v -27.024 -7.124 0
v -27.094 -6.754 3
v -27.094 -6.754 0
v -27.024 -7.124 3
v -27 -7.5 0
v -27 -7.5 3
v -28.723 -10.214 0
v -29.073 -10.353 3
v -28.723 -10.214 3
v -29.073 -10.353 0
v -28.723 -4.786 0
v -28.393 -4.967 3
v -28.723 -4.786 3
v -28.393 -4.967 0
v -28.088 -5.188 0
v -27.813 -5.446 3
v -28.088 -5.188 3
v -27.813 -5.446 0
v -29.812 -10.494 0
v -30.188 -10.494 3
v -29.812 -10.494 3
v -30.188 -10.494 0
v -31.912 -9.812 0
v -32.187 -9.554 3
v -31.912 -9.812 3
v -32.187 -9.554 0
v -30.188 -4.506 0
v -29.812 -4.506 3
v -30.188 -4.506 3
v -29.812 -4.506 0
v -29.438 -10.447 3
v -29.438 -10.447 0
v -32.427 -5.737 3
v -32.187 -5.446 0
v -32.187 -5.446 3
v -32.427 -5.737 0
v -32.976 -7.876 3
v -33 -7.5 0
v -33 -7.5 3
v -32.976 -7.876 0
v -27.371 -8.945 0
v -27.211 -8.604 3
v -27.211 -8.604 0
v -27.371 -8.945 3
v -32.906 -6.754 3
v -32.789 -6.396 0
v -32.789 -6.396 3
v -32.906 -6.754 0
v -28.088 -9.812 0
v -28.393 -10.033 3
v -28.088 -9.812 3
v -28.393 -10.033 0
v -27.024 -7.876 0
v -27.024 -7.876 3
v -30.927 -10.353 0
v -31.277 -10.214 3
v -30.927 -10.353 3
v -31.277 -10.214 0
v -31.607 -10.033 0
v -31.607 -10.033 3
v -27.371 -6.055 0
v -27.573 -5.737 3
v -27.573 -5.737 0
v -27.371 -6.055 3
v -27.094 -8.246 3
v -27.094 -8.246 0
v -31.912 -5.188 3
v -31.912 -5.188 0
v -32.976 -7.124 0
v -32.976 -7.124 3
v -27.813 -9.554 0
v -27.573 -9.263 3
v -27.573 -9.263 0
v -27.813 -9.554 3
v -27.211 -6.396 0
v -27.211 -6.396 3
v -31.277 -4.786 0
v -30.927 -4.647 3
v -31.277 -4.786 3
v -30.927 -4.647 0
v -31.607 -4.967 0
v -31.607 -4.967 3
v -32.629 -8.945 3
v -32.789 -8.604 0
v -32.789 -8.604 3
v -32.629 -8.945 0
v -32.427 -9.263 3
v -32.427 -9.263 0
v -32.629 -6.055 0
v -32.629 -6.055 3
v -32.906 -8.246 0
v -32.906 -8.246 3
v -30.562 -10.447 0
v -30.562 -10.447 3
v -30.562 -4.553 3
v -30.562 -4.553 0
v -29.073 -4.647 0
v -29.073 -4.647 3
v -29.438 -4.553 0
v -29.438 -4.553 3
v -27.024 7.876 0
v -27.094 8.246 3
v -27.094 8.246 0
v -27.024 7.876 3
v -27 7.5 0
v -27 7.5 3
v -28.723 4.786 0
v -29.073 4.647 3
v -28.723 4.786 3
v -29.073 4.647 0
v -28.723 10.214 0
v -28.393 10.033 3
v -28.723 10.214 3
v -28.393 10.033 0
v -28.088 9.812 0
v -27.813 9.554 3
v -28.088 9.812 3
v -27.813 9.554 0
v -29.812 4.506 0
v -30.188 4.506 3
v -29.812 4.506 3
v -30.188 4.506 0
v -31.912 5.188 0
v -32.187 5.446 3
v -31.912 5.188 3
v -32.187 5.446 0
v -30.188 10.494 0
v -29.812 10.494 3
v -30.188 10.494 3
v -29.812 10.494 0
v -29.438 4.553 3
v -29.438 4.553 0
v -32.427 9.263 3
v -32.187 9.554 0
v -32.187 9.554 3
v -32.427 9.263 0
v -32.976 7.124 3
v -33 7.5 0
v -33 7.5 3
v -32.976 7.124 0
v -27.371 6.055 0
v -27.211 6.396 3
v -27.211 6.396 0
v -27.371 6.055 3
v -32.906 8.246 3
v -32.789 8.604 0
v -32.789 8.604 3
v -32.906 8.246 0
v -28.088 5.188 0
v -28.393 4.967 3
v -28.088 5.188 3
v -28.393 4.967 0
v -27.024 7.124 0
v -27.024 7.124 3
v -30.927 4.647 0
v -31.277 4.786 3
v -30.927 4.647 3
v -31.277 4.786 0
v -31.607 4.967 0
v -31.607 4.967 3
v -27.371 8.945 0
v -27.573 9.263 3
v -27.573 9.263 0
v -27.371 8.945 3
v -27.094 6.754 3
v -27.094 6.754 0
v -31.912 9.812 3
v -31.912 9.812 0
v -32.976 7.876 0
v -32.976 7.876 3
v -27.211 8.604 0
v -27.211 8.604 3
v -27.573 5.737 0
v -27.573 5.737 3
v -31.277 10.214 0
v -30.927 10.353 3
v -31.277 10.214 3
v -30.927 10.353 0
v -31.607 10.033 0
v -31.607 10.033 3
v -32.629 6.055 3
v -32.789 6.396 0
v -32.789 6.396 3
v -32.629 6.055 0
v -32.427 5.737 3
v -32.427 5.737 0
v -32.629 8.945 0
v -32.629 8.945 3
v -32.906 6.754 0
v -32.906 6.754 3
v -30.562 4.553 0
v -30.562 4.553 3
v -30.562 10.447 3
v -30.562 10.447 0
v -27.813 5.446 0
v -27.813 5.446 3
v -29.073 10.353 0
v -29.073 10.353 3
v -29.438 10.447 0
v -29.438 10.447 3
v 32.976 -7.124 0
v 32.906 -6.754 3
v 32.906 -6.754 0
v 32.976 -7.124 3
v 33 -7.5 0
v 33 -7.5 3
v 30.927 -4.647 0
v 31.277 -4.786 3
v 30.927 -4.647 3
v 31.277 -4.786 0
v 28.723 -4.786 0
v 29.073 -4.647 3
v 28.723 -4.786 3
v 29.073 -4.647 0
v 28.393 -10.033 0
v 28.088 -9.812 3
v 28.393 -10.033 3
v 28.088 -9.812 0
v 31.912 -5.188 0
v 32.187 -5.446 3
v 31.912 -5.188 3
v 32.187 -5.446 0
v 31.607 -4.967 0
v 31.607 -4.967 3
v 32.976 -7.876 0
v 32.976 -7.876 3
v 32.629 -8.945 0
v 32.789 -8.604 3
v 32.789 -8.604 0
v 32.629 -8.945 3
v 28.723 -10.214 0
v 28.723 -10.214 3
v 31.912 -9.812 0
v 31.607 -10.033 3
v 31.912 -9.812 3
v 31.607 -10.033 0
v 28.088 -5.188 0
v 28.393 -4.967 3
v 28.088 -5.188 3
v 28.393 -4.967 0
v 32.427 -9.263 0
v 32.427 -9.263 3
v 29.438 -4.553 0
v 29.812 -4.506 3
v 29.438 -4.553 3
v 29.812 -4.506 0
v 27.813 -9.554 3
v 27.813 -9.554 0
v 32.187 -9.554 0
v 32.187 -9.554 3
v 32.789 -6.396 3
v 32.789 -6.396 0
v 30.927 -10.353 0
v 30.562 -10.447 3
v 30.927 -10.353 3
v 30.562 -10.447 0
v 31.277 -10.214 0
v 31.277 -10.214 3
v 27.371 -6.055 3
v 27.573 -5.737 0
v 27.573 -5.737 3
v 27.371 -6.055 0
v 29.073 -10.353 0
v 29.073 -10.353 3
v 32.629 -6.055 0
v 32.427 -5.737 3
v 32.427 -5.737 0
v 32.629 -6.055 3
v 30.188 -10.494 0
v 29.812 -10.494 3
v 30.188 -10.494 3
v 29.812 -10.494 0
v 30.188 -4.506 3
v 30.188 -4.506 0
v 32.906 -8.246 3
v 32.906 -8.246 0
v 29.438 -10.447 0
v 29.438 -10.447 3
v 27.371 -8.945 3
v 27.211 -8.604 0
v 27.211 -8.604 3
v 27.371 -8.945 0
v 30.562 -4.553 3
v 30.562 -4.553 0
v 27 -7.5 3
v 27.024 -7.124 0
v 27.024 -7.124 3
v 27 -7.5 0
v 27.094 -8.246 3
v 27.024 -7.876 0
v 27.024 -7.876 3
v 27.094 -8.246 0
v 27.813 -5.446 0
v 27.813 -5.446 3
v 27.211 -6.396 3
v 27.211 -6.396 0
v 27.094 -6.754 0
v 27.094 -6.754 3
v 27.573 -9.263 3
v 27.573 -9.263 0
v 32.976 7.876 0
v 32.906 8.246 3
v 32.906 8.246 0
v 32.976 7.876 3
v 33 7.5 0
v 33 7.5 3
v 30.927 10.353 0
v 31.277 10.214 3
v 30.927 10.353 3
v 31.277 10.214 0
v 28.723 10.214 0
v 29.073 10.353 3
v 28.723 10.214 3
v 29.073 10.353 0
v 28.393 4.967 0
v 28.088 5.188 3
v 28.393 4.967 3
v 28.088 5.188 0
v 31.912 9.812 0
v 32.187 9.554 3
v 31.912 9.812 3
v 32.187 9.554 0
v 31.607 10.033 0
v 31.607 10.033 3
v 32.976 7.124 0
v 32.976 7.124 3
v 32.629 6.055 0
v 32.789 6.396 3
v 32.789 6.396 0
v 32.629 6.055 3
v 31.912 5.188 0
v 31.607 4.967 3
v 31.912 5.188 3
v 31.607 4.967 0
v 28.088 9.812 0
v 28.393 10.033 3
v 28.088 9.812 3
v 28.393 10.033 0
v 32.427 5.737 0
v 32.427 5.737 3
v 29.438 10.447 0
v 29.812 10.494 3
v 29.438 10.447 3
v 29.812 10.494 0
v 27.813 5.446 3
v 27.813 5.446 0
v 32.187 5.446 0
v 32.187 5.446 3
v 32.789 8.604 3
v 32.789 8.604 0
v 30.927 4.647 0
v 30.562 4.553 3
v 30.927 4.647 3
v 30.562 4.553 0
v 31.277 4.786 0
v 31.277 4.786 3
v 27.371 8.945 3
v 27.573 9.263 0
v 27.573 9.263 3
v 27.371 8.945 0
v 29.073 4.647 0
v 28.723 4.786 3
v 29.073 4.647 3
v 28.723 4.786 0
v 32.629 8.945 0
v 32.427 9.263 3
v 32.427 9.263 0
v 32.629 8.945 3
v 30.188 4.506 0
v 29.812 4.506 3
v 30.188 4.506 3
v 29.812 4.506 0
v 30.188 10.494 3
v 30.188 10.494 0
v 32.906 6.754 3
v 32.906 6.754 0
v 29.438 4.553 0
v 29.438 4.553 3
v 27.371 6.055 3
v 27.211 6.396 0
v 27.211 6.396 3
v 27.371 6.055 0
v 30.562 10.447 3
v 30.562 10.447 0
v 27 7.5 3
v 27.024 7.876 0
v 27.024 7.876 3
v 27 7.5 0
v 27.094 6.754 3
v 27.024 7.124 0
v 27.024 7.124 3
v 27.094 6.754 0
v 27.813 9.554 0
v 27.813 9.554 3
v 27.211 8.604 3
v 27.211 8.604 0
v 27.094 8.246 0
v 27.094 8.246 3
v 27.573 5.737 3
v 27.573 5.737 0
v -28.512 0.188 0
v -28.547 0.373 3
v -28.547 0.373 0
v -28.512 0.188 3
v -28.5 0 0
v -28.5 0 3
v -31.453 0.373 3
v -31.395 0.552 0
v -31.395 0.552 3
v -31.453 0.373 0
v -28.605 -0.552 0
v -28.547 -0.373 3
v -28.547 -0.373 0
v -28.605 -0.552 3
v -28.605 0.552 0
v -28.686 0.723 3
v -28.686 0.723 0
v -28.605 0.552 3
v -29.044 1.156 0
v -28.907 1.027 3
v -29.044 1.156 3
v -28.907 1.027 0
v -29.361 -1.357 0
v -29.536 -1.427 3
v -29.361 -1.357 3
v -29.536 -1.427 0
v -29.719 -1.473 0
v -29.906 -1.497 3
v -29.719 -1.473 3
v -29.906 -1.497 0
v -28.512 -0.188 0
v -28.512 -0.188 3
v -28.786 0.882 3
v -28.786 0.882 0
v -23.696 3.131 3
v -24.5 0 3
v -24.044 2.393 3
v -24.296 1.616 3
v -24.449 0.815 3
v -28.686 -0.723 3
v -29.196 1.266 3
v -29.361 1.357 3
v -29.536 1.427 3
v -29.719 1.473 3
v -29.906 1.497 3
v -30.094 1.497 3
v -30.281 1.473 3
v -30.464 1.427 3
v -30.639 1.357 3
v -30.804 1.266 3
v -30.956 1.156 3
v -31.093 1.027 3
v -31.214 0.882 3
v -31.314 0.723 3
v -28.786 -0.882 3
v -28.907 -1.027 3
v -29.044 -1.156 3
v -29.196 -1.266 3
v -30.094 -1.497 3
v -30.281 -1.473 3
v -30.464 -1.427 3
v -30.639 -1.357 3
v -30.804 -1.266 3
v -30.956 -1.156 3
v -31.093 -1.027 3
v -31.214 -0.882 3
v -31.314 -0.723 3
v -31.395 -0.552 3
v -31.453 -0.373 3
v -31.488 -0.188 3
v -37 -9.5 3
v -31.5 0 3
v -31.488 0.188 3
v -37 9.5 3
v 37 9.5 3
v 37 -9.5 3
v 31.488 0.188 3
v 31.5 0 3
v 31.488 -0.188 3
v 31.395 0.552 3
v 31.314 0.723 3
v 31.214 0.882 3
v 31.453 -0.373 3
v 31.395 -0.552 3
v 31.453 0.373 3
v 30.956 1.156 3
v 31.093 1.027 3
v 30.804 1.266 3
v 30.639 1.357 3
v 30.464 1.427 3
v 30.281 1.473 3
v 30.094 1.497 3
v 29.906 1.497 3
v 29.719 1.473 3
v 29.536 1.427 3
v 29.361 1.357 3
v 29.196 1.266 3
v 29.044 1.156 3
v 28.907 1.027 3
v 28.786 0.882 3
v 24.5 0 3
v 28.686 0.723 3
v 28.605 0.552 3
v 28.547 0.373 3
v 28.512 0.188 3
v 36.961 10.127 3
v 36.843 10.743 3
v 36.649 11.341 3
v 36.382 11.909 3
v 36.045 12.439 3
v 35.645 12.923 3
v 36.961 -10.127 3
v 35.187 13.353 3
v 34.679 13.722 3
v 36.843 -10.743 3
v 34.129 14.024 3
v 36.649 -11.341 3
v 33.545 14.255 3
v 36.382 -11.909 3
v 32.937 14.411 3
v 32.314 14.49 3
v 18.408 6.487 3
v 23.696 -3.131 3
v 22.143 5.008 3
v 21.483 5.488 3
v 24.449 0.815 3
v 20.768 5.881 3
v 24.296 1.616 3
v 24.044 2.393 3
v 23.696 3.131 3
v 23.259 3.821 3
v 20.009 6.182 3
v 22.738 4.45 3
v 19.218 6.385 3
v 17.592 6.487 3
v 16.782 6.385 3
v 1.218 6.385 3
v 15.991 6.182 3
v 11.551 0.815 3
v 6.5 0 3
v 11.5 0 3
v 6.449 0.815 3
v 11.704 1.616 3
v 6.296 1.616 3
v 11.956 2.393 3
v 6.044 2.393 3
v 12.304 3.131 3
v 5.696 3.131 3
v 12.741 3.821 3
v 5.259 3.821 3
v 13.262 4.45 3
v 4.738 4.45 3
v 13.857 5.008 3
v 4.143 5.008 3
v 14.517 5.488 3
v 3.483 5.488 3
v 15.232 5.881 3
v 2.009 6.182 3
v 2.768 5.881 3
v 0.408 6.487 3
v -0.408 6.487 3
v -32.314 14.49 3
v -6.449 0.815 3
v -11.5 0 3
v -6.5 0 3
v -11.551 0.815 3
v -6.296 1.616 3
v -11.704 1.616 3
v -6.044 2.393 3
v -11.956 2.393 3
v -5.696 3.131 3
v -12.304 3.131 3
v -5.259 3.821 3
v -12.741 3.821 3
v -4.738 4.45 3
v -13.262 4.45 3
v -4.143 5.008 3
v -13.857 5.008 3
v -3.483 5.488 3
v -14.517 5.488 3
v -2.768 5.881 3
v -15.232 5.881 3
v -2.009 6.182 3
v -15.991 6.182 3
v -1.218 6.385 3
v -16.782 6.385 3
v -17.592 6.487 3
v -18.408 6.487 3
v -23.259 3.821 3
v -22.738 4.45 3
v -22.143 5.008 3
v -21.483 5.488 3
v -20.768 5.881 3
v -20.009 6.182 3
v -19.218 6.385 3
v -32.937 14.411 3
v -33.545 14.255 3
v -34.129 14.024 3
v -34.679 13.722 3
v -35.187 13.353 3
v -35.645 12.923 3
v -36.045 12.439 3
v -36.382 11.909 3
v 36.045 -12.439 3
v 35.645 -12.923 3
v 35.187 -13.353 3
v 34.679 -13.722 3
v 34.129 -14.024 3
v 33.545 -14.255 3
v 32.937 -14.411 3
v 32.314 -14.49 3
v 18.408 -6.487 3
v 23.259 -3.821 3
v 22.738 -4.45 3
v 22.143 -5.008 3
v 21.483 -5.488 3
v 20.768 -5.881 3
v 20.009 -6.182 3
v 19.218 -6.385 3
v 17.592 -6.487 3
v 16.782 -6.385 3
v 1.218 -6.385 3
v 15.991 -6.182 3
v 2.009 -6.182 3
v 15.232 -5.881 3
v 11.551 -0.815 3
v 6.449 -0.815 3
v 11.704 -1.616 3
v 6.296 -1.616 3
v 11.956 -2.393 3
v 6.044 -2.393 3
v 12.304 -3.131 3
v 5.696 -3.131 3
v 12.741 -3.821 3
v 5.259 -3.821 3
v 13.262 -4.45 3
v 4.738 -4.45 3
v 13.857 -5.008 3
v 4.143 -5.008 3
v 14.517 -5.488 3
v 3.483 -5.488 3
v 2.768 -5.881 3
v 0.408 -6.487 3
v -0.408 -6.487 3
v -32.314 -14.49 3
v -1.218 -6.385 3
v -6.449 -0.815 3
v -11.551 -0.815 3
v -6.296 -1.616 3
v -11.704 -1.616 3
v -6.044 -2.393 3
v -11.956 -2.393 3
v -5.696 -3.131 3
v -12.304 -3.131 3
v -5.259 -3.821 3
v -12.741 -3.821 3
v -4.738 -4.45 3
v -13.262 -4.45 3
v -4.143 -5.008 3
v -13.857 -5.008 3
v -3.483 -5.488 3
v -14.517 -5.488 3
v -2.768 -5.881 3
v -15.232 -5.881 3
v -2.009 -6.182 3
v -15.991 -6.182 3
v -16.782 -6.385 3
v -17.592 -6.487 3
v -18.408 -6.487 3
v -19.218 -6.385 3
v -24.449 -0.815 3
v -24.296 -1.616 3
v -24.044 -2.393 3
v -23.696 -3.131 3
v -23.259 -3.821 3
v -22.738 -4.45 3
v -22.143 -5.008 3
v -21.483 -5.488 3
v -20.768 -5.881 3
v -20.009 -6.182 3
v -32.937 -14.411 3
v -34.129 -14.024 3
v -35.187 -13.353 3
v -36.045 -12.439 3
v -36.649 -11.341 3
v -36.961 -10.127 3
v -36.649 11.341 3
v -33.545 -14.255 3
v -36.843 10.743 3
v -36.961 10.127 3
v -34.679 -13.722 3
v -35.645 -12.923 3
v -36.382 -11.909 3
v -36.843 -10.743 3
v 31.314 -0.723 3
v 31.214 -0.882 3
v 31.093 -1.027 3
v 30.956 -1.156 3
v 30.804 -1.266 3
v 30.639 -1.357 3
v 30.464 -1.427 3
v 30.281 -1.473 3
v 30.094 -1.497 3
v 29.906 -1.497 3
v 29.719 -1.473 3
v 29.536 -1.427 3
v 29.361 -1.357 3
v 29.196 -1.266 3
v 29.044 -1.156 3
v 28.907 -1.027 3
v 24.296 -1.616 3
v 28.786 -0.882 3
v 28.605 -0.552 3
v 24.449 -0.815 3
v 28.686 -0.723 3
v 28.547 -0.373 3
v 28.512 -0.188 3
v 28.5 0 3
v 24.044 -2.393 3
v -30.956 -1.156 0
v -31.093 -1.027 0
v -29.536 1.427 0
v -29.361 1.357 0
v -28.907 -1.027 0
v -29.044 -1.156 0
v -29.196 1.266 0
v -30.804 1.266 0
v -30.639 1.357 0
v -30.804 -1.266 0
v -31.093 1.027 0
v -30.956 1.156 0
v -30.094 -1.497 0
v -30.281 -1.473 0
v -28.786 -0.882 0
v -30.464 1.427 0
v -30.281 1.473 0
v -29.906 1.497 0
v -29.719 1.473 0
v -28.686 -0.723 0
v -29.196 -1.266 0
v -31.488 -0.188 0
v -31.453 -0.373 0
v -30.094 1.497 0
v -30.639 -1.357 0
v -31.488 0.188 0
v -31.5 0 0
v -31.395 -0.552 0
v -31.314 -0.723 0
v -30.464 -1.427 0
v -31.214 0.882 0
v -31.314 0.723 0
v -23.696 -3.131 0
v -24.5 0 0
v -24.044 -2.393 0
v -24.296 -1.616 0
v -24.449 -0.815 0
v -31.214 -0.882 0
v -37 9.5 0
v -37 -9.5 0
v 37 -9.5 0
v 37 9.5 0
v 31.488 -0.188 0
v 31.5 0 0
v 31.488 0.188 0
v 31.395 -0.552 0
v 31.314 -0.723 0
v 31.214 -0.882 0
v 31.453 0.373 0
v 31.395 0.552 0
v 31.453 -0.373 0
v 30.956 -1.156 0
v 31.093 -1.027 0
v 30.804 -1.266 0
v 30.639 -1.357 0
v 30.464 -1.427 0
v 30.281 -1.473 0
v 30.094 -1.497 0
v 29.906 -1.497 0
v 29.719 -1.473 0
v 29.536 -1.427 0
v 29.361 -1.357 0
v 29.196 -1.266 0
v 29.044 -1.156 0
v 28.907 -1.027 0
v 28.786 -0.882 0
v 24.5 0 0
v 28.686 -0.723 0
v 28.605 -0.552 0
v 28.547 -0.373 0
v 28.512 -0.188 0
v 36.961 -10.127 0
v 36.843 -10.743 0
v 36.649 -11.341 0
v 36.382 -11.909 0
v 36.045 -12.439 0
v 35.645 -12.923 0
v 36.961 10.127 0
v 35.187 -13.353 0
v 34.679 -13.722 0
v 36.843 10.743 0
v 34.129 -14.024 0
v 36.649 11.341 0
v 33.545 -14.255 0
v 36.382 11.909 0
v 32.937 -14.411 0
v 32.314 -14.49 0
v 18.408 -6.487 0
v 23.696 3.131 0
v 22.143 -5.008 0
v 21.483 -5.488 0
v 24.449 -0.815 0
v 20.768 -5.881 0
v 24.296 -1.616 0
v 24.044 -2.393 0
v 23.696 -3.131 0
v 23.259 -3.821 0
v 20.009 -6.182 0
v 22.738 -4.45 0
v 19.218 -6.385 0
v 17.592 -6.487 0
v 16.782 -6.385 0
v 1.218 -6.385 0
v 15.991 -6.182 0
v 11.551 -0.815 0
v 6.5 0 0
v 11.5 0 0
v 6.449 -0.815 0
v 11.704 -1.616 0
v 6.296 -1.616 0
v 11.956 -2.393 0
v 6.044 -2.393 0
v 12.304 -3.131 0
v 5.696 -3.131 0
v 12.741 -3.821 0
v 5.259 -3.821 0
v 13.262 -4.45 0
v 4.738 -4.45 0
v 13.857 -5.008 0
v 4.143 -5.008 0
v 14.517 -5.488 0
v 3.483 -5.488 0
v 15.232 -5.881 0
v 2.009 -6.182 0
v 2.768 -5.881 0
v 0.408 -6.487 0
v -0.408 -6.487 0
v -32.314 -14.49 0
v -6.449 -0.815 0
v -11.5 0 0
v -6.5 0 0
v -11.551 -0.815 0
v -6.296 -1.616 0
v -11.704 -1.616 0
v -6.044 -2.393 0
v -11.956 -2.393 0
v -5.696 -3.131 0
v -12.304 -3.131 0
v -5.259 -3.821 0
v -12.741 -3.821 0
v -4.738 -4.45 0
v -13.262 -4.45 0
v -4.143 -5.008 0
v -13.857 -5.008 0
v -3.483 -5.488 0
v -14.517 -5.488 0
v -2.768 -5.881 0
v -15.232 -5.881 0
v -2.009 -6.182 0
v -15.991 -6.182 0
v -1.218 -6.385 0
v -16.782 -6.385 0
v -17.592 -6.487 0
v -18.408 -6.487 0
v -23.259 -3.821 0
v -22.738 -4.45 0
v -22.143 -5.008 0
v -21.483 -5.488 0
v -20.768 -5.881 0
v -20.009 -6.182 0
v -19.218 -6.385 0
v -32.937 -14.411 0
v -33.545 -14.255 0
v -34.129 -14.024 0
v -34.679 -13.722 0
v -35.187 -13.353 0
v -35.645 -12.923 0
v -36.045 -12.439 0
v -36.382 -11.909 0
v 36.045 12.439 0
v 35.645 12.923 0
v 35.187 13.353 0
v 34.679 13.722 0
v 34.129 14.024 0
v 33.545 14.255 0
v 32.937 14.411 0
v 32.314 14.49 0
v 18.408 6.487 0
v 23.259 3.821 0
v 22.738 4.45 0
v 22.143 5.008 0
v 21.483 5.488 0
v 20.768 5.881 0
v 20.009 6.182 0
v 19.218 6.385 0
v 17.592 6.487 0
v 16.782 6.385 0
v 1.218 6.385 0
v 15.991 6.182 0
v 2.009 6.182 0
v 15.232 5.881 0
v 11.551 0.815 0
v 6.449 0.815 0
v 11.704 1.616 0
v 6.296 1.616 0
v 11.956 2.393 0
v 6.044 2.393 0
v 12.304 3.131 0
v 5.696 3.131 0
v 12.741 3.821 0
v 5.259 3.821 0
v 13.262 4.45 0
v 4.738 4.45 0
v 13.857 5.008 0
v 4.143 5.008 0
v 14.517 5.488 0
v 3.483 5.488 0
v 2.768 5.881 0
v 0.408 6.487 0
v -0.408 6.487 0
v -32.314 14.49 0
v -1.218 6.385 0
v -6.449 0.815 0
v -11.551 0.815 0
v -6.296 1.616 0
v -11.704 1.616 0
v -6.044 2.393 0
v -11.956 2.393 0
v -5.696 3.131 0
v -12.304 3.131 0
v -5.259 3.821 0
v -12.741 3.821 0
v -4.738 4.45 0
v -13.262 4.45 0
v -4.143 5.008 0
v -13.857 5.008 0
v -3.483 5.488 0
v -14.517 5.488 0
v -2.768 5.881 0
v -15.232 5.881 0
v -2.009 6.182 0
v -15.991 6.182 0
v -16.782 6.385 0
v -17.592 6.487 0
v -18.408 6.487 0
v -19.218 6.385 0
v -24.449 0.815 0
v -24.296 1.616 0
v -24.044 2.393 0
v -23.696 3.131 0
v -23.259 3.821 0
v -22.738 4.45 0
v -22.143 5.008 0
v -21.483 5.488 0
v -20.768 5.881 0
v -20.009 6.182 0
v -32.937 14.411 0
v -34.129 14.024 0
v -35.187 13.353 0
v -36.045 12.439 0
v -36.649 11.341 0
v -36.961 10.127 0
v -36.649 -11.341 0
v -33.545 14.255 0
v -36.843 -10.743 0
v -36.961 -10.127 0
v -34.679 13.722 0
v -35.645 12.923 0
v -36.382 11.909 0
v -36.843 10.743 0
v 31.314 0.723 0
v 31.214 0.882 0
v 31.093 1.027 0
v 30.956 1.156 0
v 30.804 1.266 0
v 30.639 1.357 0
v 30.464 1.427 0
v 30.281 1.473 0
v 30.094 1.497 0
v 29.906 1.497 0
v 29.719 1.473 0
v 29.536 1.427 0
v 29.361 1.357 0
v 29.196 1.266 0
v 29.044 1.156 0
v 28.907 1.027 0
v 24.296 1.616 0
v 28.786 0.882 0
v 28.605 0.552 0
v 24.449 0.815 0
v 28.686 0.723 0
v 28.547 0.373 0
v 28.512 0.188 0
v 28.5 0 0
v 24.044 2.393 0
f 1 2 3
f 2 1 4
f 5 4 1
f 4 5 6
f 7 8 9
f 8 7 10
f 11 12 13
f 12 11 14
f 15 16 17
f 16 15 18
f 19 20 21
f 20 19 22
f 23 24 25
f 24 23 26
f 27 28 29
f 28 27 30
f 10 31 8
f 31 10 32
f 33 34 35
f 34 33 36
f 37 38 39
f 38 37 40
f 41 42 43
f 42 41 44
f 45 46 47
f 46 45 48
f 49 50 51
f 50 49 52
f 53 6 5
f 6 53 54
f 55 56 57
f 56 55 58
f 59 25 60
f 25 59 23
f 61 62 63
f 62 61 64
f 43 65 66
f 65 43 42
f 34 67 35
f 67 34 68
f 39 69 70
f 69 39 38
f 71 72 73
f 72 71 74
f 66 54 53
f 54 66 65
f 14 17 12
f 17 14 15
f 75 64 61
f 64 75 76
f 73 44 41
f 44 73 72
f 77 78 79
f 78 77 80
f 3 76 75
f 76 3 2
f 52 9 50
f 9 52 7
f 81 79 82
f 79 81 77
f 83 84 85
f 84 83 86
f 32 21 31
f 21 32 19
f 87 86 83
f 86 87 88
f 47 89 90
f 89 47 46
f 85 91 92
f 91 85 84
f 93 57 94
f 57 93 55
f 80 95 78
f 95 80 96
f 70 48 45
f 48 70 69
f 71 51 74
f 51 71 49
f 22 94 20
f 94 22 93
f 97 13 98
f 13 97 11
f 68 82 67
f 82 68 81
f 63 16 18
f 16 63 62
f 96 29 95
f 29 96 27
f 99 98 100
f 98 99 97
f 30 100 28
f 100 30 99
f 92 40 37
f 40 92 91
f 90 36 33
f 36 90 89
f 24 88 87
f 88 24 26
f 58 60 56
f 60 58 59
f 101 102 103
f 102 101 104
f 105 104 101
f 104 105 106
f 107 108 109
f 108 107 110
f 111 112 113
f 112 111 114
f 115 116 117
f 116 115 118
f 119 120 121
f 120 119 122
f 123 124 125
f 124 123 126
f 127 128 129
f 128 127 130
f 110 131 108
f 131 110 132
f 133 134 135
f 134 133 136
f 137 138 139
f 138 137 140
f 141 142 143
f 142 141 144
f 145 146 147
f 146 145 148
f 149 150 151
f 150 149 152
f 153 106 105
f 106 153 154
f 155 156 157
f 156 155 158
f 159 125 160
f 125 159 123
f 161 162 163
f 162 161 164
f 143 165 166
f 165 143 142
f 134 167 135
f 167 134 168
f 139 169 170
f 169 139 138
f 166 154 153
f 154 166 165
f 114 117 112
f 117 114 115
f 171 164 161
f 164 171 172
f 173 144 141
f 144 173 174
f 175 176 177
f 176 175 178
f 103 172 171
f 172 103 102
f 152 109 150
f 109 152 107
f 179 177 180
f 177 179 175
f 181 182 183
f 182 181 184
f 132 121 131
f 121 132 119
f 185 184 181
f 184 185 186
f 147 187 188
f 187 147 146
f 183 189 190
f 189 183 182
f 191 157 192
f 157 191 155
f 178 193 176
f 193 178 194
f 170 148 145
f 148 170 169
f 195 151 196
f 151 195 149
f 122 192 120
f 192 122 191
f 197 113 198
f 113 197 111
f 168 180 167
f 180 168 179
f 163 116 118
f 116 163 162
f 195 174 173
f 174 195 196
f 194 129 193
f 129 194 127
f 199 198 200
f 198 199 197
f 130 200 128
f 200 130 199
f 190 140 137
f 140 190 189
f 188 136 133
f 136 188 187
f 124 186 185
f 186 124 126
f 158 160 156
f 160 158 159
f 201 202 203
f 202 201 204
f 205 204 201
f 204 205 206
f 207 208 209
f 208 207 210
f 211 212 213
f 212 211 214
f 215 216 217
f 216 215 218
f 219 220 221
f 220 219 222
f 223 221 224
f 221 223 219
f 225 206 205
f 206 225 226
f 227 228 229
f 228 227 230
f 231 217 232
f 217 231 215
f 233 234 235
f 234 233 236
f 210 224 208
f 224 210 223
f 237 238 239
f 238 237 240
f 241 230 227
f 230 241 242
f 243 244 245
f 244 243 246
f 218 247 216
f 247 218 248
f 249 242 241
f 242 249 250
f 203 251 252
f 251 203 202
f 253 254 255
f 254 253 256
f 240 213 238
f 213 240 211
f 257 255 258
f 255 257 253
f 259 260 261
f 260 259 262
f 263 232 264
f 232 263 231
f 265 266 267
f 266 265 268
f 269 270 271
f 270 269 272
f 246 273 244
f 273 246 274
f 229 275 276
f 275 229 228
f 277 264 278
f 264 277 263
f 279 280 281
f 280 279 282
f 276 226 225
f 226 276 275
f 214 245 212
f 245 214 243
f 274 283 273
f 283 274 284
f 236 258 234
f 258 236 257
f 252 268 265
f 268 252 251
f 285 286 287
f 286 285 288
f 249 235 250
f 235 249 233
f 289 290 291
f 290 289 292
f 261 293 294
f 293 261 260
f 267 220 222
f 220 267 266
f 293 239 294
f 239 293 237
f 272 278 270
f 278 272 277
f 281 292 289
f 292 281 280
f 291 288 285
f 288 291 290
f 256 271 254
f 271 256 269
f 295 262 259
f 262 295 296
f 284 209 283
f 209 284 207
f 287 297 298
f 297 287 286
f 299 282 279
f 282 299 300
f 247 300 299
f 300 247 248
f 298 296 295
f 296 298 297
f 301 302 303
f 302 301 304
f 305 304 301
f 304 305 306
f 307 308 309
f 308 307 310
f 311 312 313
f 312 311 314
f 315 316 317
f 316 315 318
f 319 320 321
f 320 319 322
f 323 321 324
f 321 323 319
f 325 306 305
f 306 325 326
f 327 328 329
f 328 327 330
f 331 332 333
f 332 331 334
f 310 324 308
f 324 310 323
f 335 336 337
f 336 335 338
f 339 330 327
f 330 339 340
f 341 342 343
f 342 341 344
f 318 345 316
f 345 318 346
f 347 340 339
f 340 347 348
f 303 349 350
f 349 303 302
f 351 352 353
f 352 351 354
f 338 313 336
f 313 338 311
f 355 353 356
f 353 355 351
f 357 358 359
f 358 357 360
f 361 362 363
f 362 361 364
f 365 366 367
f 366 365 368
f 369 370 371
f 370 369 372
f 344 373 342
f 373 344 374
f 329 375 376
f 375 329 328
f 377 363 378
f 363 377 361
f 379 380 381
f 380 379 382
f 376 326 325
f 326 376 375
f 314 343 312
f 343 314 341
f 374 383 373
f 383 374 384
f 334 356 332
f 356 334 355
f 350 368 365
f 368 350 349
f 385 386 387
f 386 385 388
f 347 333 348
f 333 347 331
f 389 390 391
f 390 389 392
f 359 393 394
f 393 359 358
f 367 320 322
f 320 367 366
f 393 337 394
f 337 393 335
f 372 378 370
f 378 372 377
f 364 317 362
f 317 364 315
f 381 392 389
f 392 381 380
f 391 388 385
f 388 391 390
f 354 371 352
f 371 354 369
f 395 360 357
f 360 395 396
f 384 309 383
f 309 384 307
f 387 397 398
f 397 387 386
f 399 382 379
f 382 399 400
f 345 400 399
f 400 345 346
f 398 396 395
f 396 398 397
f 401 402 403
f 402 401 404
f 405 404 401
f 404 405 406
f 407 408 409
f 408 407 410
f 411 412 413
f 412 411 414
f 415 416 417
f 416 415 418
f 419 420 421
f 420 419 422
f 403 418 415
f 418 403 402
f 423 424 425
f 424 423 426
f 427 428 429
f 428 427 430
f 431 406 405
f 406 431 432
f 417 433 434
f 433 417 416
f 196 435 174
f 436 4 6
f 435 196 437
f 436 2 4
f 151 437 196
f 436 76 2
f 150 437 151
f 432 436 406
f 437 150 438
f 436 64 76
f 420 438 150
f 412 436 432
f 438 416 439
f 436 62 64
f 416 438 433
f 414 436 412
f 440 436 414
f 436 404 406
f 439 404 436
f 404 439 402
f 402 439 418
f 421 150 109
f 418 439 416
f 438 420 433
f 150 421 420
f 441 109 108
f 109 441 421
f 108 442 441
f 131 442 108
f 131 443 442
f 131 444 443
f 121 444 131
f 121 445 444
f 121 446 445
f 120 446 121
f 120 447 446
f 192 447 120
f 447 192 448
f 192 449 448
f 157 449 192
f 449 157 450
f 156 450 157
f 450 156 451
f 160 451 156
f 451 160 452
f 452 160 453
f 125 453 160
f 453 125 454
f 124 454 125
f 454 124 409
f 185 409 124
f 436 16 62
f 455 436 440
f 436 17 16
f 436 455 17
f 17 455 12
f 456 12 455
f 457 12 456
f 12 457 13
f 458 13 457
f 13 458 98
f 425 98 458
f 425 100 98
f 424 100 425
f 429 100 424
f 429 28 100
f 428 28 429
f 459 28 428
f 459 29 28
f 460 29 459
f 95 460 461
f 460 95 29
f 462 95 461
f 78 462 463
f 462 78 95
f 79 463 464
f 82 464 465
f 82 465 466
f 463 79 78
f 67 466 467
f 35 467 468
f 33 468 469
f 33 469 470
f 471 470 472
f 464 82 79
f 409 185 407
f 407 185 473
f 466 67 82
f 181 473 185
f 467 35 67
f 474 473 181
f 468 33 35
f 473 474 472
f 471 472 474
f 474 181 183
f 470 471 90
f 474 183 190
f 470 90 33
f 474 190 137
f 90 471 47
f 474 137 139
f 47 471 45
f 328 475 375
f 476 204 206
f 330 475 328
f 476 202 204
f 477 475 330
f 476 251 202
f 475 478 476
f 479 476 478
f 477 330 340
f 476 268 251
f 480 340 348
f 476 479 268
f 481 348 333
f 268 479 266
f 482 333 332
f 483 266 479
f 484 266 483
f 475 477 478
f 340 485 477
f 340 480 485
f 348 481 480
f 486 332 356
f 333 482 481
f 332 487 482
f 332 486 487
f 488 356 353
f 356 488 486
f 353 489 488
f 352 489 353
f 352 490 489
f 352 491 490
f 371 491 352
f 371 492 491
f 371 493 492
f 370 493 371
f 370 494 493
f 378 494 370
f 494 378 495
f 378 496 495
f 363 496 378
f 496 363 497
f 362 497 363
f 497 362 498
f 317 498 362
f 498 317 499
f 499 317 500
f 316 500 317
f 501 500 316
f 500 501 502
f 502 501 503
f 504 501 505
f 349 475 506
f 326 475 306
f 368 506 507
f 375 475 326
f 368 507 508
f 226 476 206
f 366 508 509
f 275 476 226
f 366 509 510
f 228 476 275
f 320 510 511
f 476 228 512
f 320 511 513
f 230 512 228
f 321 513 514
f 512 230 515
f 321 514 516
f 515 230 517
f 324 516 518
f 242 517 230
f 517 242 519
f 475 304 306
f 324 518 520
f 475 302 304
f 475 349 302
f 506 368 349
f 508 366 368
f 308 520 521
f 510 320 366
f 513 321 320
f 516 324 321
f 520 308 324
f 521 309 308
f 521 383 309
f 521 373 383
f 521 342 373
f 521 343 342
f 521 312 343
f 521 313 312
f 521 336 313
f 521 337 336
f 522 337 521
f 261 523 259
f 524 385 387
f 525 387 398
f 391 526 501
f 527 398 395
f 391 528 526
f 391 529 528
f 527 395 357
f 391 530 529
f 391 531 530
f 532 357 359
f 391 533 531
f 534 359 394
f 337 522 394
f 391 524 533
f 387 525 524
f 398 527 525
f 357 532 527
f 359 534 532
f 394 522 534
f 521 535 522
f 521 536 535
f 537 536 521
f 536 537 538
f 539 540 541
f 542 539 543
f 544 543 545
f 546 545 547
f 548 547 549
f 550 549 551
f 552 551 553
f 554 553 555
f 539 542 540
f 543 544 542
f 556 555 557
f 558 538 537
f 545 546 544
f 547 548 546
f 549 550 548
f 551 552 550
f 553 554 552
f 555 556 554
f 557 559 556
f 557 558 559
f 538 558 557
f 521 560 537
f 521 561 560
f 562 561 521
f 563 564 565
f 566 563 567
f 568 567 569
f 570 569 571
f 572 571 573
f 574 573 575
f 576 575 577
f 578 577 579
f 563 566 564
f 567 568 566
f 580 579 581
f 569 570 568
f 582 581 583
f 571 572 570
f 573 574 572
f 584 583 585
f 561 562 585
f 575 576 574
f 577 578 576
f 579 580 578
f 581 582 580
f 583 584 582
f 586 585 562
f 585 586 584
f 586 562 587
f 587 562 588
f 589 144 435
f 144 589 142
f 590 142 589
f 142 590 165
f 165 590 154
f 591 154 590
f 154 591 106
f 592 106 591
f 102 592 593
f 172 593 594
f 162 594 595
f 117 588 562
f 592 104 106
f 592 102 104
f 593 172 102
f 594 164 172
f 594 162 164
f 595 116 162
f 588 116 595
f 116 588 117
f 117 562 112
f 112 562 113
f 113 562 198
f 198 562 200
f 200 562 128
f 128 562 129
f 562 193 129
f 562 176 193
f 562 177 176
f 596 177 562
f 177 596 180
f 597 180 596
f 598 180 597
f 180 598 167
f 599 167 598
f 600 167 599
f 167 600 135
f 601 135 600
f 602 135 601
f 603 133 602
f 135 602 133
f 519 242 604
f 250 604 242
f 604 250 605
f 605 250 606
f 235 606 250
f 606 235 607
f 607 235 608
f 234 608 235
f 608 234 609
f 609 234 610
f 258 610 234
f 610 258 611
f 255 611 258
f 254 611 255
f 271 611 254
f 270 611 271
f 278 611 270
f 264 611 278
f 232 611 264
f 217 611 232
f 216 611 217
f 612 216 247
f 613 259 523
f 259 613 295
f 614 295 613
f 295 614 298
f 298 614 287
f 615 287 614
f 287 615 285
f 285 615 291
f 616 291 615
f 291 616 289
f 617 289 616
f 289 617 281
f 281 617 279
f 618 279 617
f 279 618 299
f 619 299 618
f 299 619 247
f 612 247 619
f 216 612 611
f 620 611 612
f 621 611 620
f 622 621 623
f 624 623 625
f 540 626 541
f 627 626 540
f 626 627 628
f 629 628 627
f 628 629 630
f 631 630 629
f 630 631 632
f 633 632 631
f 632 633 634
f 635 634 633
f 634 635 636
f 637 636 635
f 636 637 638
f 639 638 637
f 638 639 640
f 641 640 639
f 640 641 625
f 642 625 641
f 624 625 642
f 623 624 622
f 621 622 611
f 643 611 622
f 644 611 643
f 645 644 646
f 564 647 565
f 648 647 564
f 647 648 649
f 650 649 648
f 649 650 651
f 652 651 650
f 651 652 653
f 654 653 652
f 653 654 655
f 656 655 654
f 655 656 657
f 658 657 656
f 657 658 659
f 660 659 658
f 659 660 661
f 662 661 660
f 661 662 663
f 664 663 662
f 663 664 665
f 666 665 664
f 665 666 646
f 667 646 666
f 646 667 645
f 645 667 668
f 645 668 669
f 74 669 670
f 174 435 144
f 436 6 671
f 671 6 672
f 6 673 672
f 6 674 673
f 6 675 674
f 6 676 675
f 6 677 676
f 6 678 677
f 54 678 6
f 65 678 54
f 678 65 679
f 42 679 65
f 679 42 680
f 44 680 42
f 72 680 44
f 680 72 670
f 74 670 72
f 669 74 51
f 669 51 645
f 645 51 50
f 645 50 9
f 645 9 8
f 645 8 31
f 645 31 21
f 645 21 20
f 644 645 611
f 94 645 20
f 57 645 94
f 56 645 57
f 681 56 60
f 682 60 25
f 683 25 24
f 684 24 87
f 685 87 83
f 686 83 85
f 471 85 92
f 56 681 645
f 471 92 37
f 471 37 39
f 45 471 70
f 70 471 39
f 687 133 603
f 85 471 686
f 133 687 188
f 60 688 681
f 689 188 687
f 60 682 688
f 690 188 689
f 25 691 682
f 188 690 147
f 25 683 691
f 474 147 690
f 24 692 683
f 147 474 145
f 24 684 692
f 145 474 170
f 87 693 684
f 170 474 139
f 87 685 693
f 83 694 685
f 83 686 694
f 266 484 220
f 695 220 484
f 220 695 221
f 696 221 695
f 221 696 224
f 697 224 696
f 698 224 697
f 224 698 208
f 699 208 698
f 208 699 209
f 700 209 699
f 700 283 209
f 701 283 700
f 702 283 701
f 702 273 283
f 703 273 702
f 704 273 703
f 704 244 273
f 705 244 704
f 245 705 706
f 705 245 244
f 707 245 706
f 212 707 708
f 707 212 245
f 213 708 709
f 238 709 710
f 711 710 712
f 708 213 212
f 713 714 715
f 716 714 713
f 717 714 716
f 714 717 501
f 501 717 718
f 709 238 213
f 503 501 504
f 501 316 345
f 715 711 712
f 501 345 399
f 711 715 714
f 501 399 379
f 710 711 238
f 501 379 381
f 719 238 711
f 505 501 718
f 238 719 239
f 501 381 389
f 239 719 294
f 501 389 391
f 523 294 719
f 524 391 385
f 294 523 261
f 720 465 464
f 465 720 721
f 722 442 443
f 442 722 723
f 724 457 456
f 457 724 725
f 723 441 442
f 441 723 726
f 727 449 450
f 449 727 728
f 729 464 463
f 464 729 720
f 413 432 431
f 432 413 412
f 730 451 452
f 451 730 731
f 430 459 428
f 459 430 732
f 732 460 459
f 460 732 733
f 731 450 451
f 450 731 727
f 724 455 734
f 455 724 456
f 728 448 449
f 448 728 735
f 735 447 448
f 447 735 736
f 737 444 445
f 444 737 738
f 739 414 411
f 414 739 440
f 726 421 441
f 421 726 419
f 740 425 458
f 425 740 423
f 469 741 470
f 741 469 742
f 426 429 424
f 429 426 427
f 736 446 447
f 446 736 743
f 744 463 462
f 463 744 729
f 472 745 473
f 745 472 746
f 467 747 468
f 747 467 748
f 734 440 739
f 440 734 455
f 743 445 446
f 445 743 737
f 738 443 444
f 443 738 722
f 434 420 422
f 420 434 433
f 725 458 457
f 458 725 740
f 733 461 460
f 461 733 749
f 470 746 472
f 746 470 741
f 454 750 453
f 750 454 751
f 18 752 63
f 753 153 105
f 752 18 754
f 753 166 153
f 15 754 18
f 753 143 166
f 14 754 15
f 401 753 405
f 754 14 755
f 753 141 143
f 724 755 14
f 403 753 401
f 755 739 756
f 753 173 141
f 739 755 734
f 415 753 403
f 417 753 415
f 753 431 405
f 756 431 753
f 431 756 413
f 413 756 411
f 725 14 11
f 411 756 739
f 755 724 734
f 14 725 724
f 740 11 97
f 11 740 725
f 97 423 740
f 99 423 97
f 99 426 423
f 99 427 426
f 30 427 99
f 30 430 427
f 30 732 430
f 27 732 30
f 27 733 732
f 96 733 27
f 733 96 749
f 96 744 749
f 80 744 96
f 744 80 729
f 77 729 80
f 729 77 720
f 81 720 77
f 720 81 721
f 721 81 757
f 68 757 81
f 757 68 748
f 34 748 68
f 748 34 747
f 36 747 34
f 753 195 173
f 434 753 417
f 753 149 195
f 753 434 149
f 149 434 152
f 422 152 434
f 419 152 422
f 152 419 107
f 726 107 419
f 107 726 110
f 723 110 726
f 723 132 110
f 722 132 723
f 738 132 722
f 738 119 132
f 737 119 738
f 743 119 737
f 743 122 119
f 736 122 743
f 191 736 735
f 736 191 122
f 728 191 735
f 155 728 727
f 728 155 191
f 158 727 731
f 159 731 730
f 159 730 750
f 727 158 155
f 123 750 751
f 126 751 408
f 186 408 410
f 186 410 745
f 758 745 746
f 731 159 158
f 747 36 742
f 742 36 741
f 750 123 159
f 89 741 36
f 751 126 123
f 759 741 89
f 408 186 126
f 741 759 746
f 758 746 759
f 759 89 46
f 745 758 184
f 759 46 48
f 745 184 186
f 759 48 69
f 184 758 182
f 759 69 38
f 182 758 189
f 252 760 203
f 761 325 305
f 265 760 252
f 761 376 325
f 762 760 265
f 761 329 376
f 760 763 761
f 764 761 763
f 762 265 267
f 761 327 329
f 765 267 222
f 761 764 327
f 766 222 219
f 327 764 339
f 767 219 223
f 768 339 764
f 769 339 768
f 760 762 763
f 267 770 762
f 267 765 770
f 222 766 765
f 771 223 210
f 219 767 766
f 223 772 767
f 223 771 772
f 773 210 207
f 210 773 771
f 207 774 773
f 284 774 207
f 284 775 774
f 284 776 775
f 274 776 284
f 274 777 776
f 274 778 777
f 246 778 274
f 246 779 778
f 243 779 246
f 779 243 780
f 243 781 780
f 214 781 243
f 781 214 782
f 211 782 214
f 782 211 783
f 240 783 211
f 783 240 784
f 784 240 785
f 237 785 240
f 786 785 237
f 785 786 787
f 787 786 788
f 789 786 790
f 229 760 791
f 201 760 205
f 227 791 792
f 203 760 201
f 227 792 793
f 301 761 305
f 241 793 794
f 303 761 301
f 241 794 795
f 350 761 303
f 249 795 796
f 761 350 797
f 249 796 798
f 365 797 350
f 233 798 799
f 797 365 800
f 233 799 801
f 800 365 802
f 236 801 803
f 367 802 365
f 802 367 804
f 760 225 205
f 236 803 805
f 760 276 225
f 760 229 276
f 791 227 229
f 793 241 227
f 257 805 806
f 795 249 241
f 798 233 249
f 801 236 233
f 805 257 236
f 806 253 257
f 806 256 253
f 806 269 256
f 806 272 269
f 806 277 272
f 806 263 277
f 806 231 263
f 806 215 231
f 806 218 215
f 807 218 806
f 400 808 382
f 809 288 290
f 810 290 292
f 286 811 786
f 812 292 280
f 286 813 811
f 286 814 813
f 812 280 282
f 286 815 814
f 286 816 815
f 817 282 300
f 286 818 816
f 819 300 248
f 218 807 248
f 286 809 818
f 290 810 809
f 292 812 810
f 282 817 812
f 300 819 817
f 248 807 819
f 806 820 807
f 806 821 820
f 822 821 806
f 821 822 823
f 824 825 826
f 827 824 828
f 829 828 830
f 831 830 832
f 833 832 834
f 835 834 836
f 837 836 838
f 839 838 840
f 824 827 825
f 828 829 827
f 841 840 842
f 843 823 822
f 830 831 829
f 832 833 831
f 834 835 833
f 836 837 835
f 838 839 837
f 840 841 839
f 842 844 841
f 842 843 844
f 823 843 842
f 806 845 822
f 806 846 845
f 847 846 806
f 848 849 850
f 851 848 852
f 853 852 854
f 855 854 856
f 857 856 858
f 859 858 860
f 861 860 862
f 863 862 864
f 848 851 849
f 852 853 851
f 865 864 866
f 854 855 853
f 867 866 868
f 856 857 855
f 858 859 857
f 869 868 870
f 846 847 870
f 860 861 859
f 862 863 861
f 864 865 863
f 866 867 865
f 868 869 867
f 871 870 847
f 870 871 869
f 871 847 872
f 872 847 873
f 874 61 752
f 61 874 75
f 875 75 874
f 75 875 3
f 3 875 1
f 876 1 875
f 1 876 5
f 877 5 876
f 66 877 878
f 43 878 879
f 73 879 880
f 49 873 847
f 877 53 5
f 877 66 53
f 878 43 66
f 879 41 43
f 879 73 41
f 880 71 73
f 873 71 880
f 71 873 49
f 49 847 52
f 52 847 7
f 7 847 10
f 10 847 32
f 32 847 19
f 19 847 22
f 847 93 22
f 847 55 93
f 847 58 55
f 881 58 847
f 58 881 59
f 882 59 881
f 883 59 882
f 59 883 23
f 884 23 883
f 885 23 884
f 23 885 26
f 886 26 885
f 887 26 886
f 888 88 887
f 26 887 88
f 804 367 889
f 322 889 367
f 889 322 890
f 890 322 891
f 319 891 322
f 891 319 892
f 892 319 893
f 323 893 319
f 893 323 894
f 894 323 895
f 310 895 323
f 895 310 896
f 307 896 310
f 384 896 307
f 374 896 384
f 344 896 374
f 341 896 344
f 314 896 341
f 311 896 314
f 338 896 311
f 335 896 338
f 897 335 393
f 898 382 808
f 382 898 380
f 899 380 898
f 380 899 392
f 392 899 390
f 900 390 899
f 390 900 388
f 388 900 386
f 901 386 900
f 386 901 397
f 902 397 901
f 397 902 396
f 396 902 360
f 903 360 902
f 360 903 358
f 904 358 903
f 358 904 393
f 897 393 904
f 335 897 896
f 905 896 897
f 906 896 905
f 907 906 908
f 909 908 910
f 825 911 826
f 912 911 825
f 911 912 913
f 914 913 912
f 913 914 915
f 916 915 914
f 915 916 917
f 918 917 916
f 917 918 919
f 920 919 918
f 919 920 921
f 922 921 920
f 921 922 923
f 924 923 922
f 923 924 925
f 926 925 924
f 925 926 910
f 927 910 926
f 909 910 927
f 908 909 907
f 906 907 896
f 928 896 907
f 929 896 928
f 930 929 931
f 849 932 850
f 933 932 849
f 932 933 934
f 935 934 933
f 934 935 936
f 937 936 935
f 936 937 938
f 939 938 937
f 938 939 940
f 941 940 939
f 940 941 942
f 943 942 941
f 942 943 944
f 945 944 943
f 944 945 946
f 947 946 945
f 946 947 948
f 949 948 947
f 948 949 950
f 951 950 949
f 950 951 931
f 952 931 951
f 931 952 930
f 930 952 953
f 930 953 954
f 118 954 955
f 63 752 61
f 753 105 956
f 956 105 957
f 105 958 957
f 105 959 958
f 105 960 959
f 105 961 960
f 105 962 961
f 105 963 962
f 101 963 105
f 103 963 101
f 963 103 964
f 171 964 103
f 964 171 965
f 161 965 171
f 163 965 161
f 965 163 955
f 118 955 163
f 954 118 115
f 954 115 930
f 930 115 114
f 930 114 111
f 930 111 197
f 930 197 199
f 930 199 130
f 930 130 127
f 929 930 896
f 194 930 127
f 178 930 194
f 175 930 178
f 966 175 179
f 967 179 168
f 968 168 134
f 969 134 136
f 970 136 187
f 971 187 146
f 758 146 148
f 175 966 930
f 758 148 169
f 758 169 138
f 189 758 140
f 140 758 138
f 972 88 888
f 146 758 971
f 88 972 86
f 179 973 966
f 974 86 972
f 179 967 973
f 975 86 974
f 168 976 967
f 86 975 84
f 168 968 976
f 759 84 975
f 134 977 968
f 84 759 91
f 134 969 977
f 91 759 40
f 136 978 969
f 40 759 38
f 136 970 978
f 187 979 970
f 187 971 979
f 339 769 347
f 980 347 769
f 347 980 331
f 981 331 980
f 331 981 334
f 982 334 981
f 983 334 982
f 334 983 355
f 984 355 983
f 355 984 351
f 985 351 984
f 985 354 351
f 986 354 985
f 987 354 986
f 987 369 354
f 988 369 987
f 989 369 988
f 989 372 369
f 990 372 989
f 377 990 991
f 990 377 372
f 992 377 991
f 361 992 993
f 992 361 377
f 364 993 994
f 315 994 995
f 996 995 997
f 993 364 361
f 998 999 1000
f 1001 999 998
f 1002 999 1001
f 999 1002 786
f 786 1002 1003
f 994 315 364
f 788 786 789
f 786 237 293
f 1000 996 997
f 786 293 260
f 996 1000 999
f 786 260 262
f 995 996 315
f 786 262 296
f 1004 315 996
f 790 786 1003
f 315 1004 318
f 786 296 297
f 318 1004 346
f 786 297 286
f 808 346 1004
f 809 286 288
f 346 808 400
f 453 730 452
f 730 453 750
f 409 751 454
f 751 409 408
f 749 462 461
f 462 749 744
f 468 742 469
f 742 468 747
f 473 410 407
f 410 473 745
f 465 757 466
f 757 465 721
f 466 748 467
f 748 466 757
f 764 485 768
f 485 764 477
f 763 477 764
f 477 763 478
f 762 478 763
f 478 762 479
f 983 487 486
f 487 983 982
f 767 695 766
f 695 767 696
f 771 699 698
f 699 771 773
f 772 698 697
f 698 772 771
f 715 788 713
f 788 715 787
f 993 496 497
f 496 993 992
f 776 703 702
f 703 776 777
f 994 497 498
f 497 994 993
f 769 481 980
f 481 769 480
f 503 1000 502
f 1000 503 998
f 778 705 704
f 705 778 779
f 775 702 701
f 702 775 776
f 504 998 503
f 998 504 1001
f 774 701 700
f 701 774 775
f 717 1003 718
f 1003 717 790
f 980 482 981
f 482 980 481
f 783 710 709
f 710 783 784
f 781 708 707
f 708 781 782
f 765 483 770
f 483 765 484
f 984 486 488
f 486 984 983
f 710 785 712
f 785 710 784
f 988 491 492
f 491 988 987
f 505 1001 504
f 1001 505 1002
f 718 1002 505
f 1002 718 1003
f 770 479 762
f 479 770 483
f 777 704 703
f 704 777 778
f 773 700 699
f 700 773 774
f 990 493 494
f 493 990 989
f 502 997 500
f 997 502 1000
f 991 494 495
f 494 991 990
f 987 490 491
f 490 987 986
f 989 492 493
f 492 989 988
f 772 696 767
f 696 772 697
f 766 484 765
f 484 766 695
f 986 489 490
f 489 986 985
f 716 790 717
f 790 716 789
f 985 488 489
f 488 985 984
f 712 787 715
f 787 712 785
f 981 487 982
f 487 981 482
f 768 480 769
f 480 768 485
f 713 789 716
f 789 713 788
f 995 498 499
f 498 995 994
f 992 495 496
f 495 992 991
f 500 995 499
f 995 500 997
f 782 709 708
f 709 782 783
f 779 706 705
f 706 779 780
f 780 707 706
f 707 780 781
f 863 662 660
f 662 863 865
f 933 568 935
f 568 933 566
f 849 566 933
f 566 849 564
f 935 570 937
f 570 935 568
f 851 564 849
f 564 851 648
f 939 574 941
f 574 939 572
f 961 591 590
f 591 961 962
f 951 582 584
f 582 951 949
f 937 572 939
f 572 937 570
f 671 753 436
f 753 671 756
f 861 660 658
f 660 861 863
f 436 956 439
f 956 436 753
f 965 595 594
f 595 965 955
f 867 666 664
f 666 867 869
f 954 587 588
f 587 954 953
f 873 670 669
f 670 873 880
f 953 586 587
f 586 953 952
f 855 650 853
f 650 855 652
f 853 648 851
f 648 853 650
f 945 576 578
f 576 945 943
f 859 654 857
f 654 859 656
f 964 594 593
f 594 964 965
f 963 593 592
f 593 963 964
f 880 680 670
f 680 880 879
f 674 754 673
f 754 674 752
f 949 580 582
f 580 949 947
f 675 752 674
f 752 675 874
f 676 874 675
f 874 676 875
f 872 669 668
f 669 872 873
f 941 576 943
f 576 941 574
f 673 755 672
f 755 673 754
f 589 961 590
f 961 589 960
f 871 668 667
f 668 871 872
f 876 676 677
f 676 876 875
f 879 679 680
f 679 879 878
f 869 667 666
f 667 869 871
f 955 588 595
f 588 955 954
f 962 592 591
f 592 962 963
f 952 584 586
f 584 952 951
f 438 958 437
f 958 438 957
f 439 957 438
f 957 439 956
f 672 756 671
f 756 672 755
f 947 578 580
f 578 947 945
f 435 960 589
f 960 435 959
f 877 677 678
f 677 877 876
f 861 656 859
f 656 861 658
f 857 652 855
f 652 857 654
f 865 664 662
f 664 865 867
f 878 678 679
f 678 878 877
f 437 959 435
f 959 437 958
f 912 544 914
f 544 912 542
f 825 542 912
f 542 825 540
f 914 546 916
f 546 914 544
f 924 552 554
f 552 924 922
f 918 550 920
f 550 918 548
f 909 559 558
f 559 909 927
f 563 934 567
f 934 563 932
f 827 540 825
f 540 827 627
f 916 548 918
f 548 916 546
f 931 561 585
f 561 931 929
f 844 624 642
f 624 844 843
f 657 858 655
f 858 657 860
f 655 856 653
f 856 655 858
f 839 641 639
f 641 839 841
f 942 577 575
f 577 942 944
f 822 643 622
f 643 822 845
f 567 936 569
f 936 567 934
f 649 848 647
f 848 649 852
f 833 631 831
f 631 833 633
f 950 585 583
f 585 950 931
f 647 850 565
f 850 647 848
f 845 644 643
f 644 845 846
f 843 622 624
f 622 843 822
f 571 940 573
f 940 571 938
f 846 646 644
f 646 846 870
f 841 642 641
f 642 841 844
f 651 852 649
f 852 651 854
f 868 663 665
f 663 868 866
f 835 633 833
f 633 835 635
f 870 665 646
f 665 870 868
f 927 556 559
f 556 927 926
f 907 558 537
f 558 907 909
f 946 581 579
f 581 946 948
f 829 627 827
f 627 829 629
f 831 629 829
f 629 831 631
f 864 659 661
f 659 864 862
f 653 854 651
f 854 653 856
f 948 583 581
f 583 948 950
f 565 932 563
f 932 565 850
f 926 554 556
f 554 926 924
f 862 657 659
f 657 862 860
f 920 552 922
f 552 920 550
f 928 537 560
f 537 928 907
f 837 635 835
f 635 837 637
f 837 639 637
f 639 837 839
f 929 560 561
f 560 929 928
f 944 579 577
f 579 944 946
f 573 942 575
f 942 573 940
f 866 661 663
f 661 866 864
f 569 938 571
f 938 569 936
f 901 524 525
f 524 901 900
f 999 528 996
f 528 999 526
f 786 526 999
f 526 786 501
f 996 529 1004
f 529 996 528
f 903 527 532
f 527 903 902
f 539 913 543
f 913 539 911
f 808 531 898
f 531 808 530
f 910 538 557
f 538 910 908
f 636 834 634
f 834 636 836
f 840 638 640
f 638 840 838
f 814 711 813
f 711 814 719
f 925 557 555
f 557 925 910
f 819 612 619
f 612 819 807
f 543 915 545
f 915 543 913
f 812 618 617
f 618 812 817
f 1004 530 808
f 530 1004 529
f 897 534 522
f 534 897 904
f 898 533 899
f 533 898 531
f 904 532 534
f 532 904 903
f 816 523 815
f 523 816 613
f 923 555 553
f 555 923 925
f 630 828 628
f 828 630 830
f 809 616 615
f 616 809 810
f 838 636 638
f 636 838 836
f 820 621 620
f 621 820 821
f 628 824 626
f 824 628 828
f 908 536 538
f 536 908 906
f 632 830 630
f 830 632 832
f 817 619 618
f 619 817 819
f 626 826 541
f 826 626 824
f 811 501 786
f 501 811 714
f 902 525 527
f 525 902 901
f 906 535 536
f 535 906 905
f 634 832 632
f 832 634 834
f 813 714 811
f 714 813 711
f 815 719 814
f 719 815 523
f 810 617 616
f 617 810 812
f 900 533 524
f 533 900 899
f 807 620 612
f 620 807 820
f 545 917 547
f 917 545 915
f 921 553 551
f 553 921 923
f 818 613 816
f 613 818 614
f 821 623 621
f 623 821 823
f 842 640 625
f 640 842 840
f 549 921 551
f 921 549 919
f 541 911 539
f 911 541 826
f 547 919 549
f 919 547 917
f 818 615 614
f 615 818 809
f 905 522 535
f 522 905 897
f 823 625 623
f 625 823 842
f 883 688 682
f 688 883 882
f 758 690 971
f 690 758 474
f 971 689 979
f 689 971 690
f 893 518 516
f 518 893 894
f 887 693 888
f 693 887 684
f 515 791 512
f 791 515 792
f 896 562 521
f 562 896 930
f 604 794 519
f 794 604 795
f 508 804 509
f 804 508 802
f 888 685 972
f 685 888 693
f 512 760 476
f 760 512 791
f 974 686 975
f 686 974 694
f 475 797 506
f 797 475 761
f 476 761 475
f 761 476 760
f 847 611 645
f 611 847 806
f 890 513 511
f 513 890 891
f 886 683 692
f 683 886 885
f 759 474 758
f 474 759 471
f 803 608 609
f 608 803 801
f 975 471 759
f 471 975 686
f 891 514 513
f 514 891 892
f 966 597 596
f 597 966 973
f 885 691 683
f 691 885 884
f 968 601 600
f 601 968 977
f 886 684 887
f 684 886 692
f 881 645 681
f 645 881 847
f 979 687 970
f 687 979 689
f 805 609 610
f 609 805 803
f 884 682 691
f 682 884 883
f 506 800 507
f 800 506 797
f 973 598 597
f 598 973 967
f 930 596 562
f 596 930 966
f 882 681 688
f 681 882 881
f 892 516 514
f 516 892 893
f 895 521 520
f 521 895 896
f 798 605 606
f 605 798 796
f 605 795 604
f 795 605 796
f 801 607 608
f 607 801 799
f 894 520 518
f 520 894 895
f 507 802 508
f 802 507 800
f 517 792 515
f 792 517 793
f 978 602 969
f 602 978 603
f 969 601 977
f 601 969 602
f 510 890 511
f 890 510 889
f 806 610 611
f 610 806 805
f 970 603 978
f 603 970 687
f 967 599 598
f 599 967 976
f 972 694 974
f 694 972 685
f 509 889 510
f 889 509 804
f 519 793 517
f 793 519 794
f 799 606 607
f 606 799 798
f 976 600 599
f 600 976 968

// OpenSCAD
$fn = 50;


difference() {
	union() {
		hull() {
			translate(v = [-32.0000000000, 9.5000000000, 0]) {
				cylinder(h = 3, r = 5);
			}
			translate(v = [32.0000000000, 9.5000000000, 0]) {
				cylinder(h = 3, r = 5);
			}
			translate(v = [-32.0000000000, -9.5000000000, 0]) {
				cylinder(h = 3, r = 5);
			}
			translate(v = [32.0000000000, -9.5000000000, 0]) {
				cylinder(h = 3, r = 5);
			}
		}
	}
	union() {
		#translate(v = [-30.0000000000, -7.5000000000, 0]) {
			cylinder(h = 3, r = 3.0000000000);
		}
		#translate(v = [-30.0000000000, 7.5000000000, 0]) {
			cylinder(h = 3, r = 3.0000000000);
		}
		#translate(v = [30.0000000000, -7.5000000000, 0]) {
			cylinder(h = 3, r = 3.0000000000);
		}
		#translate(v = [30.0000000000, 7.5000000000, 0]) {
			cylinder(h = 3, r = 3.0000000000);
		}
		#translate(v = [-30.0000000000, -7.5000000000, -100.0000000000]) {
			cylinder(h = 200, r = 3.0000000000);
		}
		#translate(v = [-30.0000000000, 7.5000000000, -100.0000000000]) {
			cylinder(h = 200, r = 3.0000000000);
		}
		#translate(v = [30.0000000000, -7.5000000000, -100.0000000000]) {
			cylinder(h = 200, r = 3.0000000000);
		}
		#translate(v = [30.0000000000, 7.5000000000, -100.0000000000]) {
			cylinder(h = 200, r = 3.0000000000);
		}
		#translate(v = [-30.0000000000, -7.5000000000, 0]) {
			cylinder(h = 3, r = 1.5000000000);
		}
		#translate(v = [-30.0000000000, 0.0000000000, 0]) {
			cylinder(h = 3, r = 1.5000000000);
		}
		#translate(v = [-30.0000000000, 7.5000000000, 0]) {
			cylinder(h = 3, r = 1.5000000000);
		}
		#translate(v = [30.0000000000, -7.5000000000, 0]) {
			cylinder(h = 3, r = 1.5000000000);
		}
		#translate(v = [30.0000000000, 0.0000000000, 0]) {
			cylinder(h = 3, r = 1.5000000000);
		}
		#translate(v = [30.0000000000, 7.5000000000, 0]) {
			cylinder(h = 3, r = 1.5000000000);
		}
		#translate(v = [-30.0000000000, -7.5000000000, 0]) {
			cylinder(h = 3, r = 1.5000000000);
		}
		#translate(v = [-30.0000000000, 0.0000000000, 0]) {
			cylinder(h = 3, r = 1.5000000000);
		}
		#translate(v = [-30.0000000000, 7.5000000000, 0]) {
			cylinder(h = 3, r = 1.5000000000);
		}
		#translate(v = [30.0000000000, -7.5000000000, 0]) {
			cylinder(h = 3, r = 1.5000000000);
		}
		#translate(v = [30.0000000000, 0.0000000000, 0]) {
			cylinder(h = 3, r = 1.5000000000);
		}
		#translate(v = [30.0000000000, 7.5000000000, 0]) {
			cylinder(h = 3, r = 1.5000000000);
		}
		#translate(v = [-30.0000000000, -7.5000000000, 0]) {
			cylinder(h = 3, r = 1.5000000000);
		}
		#translate(v = [-30.0000000000, 0.0000000000, 0]) {
			cylinder(h = 3, r = 1.5000000000);
		}
		#translate(v = [-30.0000000000, 7.5000000000, 0]) {
			cylinder(h = 3, r = 1.5000000000);
		}
		#translate(v = [30.0000000000, -7.5000000000, 0]) {
			cylinder(h = 3, r = 1.5000000000);
		}
		#translate(v = [30.0000000000, 0.0000000000, 0]) {
			cylinder(h = 3, r = 1.5000000000);
		}
		#translate(v = [30.0000000000, 7.5000000000, 0]) {
			cylinder(h = 3, r = 1.5000000000);
		}
		#translate(v = [-18.0000000000, 0, 0]) {
			cylinder(h = 3, r = 6.5000000000);
		}
		#cylinder(h = 3, r = 6.5000000000);
		#translate(v = [18.0000000000, 0, 0]) {
			cylinder(h = 3, r = 6.5000000000);
		}
	}
}
